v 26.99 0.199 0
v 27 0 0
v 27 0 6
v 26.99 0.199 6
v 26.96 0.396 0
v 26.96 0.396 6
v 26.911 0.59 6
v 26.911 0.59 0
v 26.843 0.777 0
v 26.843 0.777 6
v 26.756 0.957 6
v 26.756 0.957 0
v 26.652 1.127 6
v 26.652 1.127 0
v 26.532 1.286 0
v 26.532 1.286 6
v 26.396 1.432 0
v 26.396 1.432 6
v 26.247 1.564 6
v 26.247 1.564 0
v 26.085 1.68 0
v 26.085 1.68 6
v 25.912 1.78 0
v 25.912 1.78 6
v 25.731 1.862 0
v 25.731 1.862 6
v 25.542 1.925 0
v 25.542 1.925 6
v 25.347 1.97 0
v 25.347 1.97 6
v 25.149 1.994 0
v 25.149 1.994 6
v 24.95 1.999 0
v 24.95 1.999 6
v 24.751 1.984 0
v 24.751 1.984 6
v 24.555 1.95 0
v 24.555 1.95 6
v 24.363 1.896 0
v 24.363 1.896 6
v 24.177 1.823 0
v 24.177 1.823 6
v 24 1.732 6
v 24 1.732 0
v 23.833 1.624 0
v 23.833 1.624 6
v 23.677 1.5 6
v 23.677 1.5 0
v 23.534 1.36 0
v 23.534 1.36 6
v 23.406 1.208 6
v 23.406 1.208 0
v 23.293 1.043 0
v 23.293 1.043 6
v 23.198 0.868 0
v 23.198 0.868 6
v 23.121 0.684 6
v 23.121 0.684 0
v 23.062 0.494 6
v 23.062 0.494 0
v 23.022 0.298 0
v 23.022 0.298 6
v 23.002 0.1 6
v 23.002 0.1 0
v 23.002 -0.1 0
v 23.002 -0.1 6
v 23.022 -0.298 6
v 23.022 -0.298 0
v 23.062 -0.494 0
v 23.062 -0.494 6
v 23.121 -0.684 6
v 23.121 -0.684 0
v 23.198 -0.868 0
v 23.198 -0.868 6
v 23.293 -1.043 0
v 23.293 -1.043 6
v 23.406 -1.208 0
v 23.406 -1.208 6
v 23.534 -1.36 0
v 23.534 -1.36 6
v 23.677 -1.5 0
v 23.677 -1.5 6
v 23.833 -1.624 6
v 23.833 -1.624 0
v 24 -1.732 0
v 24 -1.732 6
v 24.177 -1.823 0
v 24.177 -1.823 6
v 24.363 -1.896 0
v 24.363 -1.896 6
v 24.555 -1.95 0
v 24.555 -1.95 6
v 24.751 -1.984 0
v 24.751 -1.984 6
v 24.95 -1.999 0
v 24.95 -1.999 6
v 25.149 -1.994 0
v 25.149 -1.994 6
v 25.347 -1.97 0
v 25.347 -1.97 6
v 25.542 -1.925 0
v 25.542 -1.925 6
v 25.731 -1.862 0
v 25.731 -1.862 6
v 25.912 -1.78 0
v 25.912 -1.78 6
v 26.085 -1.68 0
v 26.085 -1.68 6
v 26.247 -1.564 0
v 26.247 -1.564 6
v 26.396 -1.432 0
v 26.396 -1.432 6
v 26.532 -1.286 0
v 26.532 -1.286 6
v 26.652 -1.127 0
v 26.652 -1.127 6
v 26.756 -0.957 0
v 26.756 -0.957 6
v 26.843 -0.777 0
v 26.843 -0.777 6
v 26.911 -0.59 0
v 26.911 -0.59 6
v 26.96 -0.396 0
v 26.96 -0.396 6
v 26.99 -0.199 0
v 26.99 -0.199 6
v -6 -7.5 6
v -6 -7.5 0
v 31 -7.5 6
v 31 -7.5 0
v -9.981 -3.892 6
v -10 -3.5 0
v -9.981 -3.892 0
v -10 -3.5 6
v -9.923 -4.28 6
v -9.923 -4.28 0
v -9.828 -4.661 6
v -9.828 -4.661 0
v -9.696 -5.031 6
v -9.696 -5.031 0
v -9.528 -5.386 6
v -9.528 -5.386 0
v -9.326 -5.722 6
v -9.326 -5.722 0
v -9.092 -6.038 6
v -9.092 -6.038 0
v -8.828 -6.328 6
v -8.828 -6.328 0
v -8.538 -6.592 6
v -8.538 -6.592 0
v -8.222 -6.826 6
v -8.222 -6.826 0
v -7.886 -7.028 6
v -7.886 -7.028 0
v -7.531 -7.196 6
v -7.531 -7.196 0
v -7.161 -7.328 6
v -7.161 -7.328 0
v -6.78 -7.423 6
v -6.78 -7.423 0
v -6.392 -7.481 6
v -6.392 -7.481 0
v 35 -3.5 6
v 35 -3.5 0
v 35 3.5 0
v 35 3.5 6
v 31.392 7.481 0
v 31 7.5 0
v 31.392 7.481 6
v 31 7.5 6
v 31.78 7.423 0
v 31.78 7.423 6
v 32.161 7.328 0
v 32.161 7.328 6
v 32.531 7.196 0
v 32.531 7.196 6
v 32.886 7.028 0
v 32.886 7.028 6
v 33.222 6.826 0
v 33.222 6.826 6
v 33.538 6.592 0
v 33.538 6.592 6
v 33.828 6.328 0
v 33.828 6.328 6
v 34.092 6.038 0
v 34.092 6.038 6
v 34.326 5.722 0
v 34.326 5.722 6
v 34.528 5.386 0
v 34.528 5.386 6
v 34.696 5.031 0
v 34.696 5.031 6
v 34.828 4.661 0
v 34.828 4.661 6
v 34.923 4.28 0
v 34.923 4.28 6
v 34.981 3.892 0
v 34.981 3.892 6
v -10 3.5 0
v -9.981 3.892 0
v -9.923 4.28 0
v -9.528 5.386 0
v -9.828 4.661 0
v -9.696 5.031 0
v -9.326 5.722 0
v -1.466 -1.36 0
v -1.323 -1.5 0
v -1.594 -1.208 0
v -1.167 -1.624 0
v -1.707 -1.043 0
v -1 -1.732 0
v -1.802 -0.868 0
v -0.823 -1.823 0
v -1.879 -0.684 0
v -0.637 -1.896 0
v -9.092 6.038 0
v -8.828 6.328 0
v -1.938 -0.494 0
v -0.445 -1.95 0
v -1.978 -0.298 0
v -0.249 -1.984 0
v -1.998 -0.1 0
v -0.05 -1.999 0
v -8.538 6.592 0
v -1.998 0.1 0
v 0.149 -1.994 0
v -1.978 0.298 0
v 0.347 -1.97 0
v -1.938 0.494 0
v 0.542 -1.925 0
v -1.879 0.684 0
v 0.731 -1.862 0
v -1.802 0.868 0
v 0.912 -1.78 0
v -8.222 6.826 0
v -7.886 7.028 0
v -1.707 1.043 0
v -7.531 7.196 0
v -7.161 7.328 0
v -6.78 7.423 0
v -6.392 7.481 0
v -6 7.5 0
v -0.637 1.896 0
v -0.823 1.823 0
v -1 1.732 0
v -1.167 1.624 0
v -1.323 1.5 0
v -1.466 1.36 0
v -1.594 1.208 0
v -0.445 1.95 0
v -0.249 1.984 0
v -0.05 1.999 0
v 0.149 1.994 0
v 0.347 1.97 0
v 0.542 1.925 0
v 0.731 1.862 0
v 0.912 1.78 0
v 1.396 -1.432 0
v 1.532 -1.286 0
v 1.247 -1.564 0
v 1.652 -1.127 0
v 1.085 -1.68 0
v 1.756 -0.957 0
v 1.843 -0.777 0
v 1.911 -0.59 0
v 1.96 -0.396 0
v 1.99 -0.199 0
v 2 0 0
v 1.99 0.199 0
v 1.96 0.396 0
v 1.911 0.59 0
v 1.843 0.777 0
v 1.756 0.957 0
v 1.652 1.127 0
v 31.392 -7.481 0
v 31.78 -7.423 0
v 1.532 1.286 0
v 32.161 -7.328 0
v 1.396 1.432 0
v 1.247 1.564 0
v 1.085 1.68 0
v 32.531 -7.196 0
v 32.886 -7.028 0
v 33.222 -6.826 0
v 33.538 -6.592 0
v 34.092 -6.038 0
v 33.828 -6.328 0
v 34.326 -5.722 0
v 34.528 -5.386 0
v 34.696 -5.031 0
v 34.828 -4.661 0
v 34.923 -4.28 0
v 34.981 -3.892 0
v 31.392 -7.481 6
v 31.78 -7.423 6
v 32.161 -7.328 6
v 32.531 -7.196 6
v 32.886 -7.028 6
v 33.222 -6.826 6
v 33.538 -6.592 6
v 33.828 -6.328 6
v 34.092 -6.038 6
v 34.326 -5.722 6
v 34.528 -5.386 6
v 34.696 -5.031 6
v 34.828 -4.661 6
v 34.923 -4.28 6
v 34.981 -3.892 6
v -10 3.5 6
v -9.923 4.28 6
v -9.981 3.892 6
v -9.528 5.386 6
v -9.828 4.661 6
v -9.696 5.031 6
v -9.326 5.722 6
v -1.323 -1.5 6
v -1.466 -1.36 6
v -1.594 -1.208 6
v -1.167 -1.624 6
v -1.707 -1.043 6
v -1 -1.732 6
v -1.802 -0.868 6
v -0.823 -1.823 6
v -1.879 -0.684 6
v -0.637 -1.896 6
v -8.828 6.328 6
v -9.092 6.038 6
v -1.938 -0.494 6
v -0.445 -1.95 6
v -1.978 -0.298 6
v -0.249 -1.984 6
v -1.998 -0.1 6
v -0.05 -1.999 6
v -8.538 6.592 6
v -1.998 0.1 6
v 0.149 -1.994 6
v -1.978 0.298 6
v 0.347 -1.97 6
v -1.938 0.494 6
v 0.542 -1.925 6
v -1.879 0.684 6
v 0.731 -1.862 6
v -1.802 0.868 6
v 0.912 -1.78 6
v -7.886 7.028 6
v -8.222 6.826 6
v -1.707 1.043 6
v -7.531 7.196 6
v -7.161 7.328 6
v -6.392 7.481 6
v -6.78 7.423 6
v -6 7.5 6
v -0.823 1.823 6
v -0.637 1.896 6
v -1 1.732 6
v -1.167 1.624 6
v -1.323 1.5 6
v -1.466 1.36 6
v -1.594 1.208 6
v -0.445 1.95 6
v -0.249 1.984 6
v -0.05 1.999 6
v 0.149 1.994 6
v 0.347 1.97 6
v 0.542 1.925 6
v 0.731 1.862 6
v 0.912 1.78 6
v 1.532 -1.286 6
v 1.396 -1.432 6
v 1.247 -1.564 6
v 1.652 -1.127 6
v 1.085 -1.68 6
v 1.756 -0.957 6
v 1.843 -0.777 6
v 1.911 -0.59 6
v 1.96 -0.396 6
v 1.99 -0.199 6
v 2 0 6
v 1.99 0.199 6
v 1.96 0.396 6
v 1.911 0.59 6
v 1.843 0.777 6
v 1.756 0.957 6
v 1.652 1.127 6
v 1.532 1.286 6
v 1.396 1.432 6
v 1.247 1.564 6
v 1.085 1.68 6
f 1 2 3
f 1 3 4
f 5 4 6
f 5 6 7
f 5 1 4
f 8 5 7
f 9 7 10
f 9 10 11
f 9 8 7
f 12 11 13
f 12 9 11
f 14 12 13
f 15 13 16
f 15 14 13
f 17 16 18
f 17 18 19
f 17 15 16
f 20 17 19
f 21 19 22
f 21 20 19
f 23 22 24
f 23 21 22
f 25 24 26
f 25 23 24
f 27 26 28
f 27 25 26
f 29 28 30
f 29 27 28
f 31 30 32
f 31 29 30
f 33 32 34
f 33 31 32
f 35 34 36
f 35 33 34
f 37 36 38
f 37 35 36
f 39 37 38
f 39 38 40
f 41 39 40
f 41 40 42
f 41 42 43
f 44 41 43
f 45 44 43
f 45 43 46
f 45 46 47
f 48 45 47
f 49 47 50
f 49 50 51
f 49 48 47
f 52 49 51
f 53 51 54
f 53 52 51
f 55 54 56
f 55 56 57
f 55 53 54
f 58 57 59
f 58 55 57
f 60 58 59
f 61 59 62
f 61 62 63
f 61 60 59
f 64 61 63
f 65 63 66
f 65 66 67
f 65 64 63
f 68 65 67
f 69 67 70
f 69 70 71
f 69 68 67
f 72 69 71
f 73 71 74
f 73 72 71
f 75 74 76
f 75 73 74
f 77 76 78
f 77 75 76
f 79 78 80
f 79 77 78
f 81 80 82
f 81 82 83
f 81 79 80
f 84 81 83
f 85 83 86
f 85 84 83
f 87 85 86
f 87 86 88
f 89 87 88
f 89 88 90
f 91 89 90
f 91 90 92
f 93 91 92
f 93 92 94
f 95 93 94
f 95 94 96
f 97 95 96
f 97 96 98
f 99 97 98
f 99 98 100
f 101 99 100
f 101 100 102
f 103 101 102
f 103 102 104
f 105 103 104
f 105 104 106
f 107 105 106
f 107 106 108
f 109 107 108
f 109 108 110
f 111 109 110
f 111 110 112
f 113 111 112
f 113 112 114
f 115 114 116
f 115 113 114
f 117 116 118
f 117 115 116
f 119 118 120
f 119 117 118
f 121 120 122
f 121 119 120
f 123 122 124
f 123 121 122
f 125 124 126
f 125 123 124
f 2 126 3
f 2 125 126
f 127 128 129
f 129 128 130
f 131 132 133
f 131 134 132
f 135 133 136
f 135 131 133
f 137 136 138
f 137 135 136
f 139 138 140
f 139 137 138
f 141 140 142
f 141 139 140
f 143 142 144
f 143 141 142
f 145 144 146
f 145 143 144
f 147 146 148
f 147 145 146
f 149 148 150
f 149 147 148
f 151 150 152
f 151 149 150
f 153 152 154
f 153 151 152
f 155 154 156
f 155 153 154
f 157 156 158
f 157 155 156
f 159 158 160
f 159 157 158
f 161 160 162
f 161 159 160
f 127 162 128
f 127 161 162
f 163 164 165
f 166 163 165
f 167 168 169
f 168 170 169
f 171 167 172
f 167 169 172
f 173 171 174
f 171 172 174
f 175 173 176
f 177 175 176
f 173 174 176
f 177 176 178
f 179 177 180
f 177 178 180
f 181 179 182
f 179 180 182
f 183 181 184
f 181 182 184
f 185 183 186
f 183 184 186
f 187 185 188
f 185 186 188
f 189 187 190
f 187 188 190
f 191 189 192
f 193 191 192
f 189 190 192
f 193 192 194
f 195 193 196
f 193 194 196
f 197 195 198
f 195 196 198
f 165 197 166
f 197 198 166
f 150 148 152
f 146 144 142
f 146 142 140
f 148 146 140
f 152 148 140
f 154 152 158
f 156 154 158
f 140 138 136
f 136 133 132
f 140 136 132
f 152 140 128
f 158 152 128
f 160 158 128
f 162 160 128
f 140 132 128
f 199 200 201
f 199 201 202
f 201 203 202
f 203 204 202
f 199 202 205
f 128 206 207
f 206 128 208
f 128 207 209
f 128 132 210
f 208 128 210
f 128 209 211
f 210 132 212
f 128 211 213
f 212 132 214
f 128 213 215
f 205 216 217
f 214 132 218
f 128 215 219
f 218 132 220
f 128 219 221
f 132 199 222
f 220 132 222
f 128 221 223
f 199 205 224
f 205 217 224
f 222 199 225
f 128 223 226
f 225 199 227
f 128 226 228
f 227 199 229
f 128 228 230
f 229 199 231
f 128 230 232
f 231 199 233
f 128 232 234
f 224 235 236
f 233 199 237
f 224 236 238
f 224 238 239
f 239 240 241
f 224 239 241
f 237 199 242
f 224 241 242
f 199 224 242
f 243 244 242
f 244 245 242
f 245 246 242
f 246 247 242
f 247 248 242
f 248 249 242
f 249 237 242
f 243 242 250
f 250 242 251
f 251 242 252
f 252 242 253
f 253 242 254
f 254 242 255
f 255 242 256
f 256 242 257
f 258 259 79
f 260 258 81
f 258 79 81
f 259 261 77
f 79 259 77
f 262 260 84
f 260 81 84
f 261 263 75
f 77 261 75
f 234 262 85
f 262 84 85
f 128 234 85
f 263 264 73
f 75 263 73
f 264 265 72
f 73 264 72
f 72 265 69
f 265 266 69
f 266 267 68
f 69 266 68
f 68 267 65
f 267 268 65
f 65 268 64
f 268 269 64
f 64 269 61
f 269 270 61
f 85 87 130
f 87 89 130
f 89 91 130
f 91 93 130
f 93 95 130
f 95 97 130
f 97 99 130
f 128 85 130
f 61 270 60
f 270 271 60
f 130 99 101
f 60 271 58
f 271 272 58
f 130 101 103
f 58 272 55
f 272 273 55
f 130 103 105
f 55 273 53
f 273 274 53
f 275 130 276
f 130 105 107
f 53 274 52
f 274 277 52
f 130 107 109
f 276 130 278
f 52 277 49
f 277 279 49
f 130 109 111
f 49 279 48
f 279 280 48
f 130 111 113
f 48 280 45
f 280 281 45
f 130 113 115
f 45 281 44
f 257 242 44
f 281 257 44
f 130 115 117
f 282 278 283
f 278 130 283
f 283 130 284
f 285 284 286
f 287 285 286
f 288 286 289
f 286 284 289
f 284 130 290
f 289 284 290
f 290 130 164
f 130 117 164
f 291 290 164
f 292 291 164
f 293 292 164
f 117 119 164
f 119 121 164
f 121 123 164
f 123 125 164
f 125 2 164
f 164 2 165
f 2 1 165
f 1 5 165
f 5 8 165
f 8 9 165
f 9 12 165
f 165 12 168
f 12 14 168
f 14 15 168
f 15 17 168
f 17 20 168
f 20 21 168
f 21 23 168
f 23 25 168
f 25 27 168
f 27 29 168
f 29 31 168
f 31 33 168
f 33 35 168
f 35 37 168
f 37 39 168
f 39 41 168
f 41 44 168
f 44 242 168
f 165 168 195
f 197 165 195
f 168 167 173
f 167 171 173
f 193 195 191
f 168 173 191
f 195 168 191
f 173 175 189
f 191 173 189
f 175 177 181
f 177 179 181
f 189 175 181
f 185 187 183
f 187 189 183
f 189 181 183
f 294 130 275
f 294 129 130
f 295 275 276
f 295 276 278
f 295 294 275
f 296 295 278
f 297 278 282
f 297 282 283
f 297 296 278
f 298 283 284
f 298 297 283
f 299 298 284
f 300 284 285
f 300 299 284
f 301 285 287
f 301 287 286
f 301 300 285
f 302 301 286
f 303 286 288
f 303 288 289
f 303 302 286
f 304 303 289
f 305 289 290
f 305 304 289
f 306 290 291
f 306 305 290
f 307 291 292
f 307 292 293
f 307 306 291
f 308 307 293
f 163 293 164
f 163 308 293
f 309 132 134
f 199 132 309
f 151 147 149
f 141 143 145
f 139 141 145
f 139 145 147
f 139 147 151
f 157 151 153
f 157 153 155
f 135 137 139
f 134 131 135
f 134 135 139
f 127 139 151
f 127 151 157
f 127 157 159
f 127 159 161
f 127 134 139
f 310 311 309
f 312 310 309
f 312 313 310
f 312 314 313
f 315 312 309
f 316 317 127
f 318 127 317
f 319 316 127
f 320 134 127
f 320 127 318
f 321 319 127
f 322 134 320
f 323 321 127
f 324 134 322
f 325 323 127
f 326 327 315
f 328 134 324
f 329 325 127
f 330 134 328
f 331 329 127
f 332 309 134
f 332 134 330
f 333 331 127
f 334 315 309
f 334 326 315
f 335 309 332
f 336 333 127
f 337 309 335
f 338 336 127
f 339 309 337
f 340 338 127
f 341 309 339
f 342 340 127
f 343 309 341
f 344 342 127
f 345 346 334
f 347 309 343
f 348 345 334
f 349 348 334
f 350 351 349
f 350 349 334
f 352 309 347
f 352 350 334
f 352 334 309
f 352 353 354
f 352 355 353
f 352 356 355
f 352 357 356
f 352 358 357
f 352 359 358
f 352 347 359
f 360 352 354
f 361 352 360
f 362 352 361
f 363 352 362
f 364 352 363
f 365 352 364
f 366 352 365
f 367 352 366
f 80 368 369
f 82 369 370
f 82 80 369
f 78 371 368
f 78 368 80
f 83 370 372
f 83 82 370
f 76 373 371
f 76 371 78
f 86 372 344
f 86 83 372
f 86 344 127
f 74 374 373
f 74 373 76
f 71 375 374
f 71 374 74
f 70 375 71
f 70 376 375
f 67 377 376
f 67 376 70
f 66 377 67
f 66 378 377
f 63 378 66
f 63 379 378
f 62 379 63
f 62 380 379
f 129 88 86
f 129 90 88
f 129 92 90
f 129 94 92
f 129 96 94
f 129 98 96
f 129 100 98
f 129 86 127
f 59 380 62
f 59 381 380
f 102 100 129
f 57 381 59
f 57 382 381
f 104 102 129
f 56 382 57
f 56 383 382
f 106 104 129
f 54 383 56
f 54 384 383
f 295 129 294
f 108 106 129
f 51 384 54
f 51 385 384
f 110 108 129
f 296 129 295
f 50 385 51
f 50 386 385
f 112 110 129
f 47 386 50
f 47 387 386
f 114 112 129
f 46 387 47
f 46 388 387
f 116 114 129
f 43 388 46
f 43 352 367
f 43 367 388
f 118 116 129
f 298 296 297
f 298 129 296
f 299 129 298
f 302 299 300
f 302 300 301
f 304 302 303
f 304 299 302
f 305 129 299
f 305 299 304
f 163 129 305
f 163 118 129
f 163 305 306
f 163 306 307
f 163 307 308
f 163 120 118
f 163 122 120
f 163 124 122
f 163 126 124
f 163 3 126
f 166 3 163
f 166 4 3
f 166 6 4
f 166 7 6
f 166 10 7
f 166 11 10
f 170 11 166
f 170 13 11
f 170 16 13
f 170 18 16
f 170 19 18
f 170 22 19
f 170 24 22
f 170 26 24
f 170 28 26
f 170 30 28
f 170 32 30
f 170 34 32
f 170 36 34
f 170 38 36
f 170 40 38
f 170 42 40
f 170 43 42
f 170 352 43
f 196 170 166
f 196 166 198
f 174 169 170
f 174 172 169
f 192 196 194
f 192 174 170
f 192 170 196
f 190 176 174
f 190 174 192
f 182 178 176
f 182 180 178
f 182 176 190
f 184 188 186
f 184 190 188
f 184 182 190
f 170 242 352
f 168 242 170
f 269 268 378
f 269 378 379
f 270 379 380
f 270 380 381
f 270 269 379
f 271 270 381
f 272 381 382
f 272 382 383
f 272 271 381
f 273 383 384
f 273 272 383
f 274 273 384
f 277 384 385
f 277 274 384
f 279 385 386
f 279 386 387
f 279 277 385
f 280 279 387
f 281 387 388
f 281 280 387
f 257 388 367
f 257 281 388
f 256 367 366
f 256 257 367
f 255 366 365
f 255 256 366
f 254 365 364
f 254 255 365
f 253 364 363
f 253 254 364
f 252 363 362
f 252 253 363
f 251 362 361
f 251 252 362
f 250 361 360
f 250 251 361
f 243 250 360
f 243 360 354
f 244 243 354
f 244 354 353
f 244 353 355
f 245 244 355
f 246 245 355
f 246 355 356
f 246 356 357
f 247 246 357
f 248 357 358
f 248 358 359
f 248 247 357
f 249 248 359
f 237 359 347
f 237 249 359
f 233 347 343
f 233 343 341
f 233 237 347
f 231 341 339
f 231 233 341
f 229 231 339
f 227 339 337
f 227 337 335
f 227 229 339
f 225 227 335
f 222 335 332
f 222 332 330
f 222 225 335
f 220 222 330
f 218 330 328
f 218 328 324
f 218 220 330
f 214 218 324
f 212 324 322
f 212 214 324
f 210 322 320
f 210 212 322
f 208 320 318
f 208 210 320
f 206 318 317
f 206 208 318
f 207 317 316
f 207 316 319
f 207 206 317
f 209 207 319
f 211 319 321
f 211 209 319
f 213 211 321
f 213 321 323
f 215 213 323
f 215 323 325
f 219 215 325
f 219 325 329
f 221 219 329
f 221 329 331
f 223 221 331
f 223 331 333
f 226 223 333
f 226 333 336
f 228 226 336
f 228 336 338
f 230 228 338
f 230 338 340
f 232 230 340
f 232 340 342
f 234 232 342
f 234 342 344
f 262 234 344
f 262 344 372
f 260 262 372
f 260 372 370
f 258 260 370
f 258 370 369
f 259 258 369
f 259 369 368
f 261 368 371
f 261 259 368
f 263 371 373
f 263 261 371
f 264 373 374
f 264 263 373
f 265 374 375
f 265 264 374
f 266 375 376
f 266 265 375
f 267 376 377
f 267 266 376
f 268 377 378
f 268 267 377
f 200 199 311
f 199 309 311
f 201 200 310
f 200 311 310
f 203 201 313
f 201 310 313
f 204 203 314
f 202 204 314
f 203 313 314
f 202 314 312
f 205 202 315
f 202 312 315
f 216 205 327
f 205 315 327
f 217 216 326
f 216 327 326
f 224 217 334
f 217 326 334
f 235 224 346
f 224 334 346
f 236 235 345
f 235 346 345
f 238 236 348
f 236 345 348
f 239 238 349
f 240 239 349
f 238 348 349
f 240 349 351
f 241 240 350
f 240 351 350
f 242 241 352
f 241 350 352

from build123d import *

# Parameters (mm, degrees)
SKETCH1_W           = 45
SKETCH1_H           = 15
SKETCH1_R           = 2
BOSS_EXTRUDE1_DEPTH = 6
FILLET1_R           = 4


with BuildPart() as part:
    # Sketch1 → Boss-Extrude1 (new body)
    with BuildSketch(Plane.XY):
        with Locations((12.5, 0)):
            Rectangle(SKETCH1_W, SKETCH1_H)
        Circle(SKETCH1_R, mode=Mode.SUBTRACT)
        with Locations((25, 0)):
            Circle(SKETCH1_R, mode=Mode.SUBTRACT)
    extrude(amount=BOSS_EXTRUDE1_DEPTH)

    # Fillet1
    fillet1_edges = [part.edges().sort_by_distance(p)[0] for p in [
        (-10, 7.5, 3),
        (35, 7.5, 3),
        (35, -7.5, 3),
        (-10, -7.5, 3),
    ]]
    fillet(fillet1_edges, radius=FILLET1_R)


solid = part.part
